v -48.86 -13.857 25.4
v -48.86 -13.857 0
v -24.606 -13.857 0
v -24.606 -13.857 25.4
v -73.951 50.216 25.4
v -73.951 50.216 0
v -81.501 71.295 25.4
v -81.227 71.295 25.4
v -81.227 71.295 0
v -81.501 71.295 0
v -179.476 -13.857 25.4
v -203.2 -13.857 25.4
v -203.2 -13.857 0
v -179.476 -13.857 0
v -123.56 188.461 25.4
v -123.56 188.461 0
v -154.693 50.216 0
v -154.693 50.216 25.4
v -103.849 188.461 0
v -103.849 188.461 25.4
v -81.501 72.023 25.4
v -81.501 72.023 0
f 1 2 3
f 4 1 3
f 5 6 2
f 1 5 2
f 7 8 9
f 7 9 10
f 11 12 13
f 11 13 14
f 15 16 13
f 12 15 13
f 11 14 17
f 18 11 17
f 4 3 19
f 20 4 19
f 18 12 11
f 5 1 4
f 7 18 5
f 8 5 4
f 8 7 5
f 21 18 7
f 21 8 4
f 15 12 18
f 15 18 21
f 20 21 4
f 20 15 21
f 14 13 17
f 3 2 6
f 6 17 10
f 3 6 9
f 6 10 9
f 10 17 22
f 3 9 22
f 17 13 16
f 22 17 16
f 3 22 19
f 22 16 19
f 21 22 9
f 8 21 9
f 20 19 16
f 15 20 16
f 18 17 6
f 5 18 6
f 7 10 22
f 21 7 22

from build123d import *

# Parameters (mm, degrees)
F1_DEPTH = 25.4
F2_DEPTH = 25.4


with BuildPart() as f1:
    # F0 (on Top) → F1 (new body)
    with BuildSketch(Plane.XY):
        Polygon((-123.5604166667, 188.4609023112), (-203.2, -13.8571532443), (-179.4756944444, -13.8571532443), (-154.6930555556, 50.2161106446), (-73.9510416667, 50.2161106446), (-48.8597222222, -13.8571532443), (-24.60625, -13.8571532443), (-103.8489583333, 188.4609023112), align=None)
        Polygon((-81.5007686615, 67.9640099406), (-152.8517007828, 67.9640099406), (-152.8517007828, 106.1364486814), (-139.8437470198, 106.1364486814), (-139.8437470198, 137.258246541), (-127.1816492081, 137.258246541), (-127.1816492081, 169.5059537888), (-101.4676243067, 169.5059537888), (-101.4676243067, 137.258246541), (-90.7859355211, 137.258246541), (-90.7859355211, 106.1364486814), (-81.5007686615, 106.1364486814), (-81.5007686615, 72.0230385523), (-81.2270833333, 71.2945828668), (-81.5007686615, 71.2945828668), align=None, mode=Mode.SUBTRACT)
    extrude(amount=F1_DEPTH)

    # F0 (on Top) → F2 (join)
    with BuildSketch(Plane.XY):
        Polygon((-146.4027777778, 71.2945828668), (-81.5007686615, 71.2945828668), (-81.5007686615, 72.0230385523), (-94.3173888512, 106.1364486814), (-133.1894430727, 106.1364486814), align=None)
        with BuildLine():
            Line((-122.7225694444, 133.7362495335), (-133.1894430727, 106.1364486814))
            Line((-133.1894430727, 106.1364486814), (-94.3173888512, 106.1364486814))
            Line((-94.3173888512, 106.1364486814), (-104.6868055556, 133.7362495335))
            add(Edge.make_bspline(
                [(-104.6868055556, 133.7362495335), (-105.3399663206, 135.4420771625), (-105.9985985773, 137.258246541)],
                knots=[0, 0, 0, 0.1438042201, 0.1438042201, 0.1438042201], degree=2))
            Line((-105.9985985773, 137.258246541), (-121.4879183379, 137.258246541))
            add(Edge.make_bspline(
                [(-121.4879183379, 137.258246541), (-122.0888459048, 135.5136460237), (-122.7225694444, 133.7362495335)],
                knots=[0.8877261445, 0.8877261445, 0.8877261445, 1, 1, 1], degree=2))
        make_face()
        with BuildLine():
            Line((-127.1816492081, 169.5059537888), (-127.1816492081, 137.258246541))
            Line((-127.1816492081, 137.258246541), (-121.4879183379, 137.258246541))
            add(Edge.make_bspline(
                [(-114.0354166667, 162.7963189779), (-116.7365084044, 151.0524418574), (-121.4879183379, 137.258246541)],
                knots=[0, 0, 0, 0.8877261445, 0.8877261445, 0.8877261445], degree=2))
            add(Edge.make_bspline(
                [(-105.9985985773, 137.258246541), (-109.9200284094, 148.071535305), (-114.0354166667, 162.7963189779)],
                knots=[0.1438042201, 0.1438042201, 0.1438042201, 1, 1, 1], degree=2))
            Line((-105.9985985773, 137.258246541), (-101.4676243067, 137.258246541))
            Line((-101.4676243067, 137.258246541), (-101.4676243067, 169.5059537888))
            Line((-101.4676243067, 169.5059537888), (-127.1816492081, 169.5059537888))
        make_face()
        with BuildLine():
            Line((-139.8437470198, 137.258246541), (-139.8437470198, 106.1364486814))
            Line((-139.8437470198, 106.1364486814), (-133.1894430727, 106.1364486814))
            Line((-133.1894430727, 106.1364486814), (-122.7225694444, 133.7362495335))
            add(Edge.make_bspline(
                [(-121.4879183379, 137.258246541), (-122.0888459048, 135.5136460237), (-122.7225694444, 133.7362495335)],
                knots=[0.8877261445, 0.8877261445, 0.8877261445, 1, 1, 1], degree=2))
            Line((-121.4879183379, 137.258246541), (-127.1816492081, 137.258246541))
            Line((-127.1816492081, 137.258246541), (-139.8437470198, 137.258246541))
        make_face()
        Polygon((-152.8517007828, 106.1364486814), (-152.8517007828, 67.9640099406), (-81.5007686615, 67.9640099406), (-81.5007686615, 71.2945828668), (-146.4027777778, 71.2945828668), (-133.1894430727, 106.1364486814), (-139.8437470198, 106.1364486814), align=None)
        with BuildLine():
            Line((-104.6868055556, 133.7362495335), (-94.3173888512, 106.1364486814))
            Line((-94.3173888512, 106.1364486814), (-90.7859355211, 106.1364486814))
            Line((-90.7859355211, 106.1364486814), (-90.7859355211, 137.258246541))
            Line((-90.7859355211, 137.258246541), (-101.4676243067, 137.258246541))
            Line((-101.4676243067, 137.258246541), (-105.9985985773, 137.258246541))
            add(Edge.make_bspline(
                [(-104.6868055556, 133.7362495335), (-105.3399663206, 135.4420771625), (-105.9985985773, 137.258246541)],
                knots=[0, 0, 0, 0.1438042201, 0.1438042201, 0.1438042201], degree=2))
        make_face()
        Polygon((-94.3173888512, 106.1364486814), (-81.5007686615, 72.0230385523), (-81.5007686615, 106.1364486814), (-90.7859355211, 106.1364486814), align=None)
        with BuildLine():
            add(Edge.make_bspline(
                [(-114.0354166667, 162.7963189779), (-116.7365084044, 151.0524418574), (-121.4879183379, 137.258246541)],
                knots=[0, 0, 0, 0.8877261445, 0.8877261445, 0.8877261445], degree=2))
            Line((-121.4879183379, 137.258246541), (-105.9985985773, 137.258246541))
            add(Edge.make_bspline(
                [(-105.9985985773, 137.258246541), (-109.9200284094, 148.071535305), (-114.0354166667, 162.7963189779)],
                knots=[0.1438042201, 0.1438042201, 0.1438042201, 1, 1, 1], degree=2))
        make_face()
    extrude(amount=F2_DEPTH)


solid = f1.part
